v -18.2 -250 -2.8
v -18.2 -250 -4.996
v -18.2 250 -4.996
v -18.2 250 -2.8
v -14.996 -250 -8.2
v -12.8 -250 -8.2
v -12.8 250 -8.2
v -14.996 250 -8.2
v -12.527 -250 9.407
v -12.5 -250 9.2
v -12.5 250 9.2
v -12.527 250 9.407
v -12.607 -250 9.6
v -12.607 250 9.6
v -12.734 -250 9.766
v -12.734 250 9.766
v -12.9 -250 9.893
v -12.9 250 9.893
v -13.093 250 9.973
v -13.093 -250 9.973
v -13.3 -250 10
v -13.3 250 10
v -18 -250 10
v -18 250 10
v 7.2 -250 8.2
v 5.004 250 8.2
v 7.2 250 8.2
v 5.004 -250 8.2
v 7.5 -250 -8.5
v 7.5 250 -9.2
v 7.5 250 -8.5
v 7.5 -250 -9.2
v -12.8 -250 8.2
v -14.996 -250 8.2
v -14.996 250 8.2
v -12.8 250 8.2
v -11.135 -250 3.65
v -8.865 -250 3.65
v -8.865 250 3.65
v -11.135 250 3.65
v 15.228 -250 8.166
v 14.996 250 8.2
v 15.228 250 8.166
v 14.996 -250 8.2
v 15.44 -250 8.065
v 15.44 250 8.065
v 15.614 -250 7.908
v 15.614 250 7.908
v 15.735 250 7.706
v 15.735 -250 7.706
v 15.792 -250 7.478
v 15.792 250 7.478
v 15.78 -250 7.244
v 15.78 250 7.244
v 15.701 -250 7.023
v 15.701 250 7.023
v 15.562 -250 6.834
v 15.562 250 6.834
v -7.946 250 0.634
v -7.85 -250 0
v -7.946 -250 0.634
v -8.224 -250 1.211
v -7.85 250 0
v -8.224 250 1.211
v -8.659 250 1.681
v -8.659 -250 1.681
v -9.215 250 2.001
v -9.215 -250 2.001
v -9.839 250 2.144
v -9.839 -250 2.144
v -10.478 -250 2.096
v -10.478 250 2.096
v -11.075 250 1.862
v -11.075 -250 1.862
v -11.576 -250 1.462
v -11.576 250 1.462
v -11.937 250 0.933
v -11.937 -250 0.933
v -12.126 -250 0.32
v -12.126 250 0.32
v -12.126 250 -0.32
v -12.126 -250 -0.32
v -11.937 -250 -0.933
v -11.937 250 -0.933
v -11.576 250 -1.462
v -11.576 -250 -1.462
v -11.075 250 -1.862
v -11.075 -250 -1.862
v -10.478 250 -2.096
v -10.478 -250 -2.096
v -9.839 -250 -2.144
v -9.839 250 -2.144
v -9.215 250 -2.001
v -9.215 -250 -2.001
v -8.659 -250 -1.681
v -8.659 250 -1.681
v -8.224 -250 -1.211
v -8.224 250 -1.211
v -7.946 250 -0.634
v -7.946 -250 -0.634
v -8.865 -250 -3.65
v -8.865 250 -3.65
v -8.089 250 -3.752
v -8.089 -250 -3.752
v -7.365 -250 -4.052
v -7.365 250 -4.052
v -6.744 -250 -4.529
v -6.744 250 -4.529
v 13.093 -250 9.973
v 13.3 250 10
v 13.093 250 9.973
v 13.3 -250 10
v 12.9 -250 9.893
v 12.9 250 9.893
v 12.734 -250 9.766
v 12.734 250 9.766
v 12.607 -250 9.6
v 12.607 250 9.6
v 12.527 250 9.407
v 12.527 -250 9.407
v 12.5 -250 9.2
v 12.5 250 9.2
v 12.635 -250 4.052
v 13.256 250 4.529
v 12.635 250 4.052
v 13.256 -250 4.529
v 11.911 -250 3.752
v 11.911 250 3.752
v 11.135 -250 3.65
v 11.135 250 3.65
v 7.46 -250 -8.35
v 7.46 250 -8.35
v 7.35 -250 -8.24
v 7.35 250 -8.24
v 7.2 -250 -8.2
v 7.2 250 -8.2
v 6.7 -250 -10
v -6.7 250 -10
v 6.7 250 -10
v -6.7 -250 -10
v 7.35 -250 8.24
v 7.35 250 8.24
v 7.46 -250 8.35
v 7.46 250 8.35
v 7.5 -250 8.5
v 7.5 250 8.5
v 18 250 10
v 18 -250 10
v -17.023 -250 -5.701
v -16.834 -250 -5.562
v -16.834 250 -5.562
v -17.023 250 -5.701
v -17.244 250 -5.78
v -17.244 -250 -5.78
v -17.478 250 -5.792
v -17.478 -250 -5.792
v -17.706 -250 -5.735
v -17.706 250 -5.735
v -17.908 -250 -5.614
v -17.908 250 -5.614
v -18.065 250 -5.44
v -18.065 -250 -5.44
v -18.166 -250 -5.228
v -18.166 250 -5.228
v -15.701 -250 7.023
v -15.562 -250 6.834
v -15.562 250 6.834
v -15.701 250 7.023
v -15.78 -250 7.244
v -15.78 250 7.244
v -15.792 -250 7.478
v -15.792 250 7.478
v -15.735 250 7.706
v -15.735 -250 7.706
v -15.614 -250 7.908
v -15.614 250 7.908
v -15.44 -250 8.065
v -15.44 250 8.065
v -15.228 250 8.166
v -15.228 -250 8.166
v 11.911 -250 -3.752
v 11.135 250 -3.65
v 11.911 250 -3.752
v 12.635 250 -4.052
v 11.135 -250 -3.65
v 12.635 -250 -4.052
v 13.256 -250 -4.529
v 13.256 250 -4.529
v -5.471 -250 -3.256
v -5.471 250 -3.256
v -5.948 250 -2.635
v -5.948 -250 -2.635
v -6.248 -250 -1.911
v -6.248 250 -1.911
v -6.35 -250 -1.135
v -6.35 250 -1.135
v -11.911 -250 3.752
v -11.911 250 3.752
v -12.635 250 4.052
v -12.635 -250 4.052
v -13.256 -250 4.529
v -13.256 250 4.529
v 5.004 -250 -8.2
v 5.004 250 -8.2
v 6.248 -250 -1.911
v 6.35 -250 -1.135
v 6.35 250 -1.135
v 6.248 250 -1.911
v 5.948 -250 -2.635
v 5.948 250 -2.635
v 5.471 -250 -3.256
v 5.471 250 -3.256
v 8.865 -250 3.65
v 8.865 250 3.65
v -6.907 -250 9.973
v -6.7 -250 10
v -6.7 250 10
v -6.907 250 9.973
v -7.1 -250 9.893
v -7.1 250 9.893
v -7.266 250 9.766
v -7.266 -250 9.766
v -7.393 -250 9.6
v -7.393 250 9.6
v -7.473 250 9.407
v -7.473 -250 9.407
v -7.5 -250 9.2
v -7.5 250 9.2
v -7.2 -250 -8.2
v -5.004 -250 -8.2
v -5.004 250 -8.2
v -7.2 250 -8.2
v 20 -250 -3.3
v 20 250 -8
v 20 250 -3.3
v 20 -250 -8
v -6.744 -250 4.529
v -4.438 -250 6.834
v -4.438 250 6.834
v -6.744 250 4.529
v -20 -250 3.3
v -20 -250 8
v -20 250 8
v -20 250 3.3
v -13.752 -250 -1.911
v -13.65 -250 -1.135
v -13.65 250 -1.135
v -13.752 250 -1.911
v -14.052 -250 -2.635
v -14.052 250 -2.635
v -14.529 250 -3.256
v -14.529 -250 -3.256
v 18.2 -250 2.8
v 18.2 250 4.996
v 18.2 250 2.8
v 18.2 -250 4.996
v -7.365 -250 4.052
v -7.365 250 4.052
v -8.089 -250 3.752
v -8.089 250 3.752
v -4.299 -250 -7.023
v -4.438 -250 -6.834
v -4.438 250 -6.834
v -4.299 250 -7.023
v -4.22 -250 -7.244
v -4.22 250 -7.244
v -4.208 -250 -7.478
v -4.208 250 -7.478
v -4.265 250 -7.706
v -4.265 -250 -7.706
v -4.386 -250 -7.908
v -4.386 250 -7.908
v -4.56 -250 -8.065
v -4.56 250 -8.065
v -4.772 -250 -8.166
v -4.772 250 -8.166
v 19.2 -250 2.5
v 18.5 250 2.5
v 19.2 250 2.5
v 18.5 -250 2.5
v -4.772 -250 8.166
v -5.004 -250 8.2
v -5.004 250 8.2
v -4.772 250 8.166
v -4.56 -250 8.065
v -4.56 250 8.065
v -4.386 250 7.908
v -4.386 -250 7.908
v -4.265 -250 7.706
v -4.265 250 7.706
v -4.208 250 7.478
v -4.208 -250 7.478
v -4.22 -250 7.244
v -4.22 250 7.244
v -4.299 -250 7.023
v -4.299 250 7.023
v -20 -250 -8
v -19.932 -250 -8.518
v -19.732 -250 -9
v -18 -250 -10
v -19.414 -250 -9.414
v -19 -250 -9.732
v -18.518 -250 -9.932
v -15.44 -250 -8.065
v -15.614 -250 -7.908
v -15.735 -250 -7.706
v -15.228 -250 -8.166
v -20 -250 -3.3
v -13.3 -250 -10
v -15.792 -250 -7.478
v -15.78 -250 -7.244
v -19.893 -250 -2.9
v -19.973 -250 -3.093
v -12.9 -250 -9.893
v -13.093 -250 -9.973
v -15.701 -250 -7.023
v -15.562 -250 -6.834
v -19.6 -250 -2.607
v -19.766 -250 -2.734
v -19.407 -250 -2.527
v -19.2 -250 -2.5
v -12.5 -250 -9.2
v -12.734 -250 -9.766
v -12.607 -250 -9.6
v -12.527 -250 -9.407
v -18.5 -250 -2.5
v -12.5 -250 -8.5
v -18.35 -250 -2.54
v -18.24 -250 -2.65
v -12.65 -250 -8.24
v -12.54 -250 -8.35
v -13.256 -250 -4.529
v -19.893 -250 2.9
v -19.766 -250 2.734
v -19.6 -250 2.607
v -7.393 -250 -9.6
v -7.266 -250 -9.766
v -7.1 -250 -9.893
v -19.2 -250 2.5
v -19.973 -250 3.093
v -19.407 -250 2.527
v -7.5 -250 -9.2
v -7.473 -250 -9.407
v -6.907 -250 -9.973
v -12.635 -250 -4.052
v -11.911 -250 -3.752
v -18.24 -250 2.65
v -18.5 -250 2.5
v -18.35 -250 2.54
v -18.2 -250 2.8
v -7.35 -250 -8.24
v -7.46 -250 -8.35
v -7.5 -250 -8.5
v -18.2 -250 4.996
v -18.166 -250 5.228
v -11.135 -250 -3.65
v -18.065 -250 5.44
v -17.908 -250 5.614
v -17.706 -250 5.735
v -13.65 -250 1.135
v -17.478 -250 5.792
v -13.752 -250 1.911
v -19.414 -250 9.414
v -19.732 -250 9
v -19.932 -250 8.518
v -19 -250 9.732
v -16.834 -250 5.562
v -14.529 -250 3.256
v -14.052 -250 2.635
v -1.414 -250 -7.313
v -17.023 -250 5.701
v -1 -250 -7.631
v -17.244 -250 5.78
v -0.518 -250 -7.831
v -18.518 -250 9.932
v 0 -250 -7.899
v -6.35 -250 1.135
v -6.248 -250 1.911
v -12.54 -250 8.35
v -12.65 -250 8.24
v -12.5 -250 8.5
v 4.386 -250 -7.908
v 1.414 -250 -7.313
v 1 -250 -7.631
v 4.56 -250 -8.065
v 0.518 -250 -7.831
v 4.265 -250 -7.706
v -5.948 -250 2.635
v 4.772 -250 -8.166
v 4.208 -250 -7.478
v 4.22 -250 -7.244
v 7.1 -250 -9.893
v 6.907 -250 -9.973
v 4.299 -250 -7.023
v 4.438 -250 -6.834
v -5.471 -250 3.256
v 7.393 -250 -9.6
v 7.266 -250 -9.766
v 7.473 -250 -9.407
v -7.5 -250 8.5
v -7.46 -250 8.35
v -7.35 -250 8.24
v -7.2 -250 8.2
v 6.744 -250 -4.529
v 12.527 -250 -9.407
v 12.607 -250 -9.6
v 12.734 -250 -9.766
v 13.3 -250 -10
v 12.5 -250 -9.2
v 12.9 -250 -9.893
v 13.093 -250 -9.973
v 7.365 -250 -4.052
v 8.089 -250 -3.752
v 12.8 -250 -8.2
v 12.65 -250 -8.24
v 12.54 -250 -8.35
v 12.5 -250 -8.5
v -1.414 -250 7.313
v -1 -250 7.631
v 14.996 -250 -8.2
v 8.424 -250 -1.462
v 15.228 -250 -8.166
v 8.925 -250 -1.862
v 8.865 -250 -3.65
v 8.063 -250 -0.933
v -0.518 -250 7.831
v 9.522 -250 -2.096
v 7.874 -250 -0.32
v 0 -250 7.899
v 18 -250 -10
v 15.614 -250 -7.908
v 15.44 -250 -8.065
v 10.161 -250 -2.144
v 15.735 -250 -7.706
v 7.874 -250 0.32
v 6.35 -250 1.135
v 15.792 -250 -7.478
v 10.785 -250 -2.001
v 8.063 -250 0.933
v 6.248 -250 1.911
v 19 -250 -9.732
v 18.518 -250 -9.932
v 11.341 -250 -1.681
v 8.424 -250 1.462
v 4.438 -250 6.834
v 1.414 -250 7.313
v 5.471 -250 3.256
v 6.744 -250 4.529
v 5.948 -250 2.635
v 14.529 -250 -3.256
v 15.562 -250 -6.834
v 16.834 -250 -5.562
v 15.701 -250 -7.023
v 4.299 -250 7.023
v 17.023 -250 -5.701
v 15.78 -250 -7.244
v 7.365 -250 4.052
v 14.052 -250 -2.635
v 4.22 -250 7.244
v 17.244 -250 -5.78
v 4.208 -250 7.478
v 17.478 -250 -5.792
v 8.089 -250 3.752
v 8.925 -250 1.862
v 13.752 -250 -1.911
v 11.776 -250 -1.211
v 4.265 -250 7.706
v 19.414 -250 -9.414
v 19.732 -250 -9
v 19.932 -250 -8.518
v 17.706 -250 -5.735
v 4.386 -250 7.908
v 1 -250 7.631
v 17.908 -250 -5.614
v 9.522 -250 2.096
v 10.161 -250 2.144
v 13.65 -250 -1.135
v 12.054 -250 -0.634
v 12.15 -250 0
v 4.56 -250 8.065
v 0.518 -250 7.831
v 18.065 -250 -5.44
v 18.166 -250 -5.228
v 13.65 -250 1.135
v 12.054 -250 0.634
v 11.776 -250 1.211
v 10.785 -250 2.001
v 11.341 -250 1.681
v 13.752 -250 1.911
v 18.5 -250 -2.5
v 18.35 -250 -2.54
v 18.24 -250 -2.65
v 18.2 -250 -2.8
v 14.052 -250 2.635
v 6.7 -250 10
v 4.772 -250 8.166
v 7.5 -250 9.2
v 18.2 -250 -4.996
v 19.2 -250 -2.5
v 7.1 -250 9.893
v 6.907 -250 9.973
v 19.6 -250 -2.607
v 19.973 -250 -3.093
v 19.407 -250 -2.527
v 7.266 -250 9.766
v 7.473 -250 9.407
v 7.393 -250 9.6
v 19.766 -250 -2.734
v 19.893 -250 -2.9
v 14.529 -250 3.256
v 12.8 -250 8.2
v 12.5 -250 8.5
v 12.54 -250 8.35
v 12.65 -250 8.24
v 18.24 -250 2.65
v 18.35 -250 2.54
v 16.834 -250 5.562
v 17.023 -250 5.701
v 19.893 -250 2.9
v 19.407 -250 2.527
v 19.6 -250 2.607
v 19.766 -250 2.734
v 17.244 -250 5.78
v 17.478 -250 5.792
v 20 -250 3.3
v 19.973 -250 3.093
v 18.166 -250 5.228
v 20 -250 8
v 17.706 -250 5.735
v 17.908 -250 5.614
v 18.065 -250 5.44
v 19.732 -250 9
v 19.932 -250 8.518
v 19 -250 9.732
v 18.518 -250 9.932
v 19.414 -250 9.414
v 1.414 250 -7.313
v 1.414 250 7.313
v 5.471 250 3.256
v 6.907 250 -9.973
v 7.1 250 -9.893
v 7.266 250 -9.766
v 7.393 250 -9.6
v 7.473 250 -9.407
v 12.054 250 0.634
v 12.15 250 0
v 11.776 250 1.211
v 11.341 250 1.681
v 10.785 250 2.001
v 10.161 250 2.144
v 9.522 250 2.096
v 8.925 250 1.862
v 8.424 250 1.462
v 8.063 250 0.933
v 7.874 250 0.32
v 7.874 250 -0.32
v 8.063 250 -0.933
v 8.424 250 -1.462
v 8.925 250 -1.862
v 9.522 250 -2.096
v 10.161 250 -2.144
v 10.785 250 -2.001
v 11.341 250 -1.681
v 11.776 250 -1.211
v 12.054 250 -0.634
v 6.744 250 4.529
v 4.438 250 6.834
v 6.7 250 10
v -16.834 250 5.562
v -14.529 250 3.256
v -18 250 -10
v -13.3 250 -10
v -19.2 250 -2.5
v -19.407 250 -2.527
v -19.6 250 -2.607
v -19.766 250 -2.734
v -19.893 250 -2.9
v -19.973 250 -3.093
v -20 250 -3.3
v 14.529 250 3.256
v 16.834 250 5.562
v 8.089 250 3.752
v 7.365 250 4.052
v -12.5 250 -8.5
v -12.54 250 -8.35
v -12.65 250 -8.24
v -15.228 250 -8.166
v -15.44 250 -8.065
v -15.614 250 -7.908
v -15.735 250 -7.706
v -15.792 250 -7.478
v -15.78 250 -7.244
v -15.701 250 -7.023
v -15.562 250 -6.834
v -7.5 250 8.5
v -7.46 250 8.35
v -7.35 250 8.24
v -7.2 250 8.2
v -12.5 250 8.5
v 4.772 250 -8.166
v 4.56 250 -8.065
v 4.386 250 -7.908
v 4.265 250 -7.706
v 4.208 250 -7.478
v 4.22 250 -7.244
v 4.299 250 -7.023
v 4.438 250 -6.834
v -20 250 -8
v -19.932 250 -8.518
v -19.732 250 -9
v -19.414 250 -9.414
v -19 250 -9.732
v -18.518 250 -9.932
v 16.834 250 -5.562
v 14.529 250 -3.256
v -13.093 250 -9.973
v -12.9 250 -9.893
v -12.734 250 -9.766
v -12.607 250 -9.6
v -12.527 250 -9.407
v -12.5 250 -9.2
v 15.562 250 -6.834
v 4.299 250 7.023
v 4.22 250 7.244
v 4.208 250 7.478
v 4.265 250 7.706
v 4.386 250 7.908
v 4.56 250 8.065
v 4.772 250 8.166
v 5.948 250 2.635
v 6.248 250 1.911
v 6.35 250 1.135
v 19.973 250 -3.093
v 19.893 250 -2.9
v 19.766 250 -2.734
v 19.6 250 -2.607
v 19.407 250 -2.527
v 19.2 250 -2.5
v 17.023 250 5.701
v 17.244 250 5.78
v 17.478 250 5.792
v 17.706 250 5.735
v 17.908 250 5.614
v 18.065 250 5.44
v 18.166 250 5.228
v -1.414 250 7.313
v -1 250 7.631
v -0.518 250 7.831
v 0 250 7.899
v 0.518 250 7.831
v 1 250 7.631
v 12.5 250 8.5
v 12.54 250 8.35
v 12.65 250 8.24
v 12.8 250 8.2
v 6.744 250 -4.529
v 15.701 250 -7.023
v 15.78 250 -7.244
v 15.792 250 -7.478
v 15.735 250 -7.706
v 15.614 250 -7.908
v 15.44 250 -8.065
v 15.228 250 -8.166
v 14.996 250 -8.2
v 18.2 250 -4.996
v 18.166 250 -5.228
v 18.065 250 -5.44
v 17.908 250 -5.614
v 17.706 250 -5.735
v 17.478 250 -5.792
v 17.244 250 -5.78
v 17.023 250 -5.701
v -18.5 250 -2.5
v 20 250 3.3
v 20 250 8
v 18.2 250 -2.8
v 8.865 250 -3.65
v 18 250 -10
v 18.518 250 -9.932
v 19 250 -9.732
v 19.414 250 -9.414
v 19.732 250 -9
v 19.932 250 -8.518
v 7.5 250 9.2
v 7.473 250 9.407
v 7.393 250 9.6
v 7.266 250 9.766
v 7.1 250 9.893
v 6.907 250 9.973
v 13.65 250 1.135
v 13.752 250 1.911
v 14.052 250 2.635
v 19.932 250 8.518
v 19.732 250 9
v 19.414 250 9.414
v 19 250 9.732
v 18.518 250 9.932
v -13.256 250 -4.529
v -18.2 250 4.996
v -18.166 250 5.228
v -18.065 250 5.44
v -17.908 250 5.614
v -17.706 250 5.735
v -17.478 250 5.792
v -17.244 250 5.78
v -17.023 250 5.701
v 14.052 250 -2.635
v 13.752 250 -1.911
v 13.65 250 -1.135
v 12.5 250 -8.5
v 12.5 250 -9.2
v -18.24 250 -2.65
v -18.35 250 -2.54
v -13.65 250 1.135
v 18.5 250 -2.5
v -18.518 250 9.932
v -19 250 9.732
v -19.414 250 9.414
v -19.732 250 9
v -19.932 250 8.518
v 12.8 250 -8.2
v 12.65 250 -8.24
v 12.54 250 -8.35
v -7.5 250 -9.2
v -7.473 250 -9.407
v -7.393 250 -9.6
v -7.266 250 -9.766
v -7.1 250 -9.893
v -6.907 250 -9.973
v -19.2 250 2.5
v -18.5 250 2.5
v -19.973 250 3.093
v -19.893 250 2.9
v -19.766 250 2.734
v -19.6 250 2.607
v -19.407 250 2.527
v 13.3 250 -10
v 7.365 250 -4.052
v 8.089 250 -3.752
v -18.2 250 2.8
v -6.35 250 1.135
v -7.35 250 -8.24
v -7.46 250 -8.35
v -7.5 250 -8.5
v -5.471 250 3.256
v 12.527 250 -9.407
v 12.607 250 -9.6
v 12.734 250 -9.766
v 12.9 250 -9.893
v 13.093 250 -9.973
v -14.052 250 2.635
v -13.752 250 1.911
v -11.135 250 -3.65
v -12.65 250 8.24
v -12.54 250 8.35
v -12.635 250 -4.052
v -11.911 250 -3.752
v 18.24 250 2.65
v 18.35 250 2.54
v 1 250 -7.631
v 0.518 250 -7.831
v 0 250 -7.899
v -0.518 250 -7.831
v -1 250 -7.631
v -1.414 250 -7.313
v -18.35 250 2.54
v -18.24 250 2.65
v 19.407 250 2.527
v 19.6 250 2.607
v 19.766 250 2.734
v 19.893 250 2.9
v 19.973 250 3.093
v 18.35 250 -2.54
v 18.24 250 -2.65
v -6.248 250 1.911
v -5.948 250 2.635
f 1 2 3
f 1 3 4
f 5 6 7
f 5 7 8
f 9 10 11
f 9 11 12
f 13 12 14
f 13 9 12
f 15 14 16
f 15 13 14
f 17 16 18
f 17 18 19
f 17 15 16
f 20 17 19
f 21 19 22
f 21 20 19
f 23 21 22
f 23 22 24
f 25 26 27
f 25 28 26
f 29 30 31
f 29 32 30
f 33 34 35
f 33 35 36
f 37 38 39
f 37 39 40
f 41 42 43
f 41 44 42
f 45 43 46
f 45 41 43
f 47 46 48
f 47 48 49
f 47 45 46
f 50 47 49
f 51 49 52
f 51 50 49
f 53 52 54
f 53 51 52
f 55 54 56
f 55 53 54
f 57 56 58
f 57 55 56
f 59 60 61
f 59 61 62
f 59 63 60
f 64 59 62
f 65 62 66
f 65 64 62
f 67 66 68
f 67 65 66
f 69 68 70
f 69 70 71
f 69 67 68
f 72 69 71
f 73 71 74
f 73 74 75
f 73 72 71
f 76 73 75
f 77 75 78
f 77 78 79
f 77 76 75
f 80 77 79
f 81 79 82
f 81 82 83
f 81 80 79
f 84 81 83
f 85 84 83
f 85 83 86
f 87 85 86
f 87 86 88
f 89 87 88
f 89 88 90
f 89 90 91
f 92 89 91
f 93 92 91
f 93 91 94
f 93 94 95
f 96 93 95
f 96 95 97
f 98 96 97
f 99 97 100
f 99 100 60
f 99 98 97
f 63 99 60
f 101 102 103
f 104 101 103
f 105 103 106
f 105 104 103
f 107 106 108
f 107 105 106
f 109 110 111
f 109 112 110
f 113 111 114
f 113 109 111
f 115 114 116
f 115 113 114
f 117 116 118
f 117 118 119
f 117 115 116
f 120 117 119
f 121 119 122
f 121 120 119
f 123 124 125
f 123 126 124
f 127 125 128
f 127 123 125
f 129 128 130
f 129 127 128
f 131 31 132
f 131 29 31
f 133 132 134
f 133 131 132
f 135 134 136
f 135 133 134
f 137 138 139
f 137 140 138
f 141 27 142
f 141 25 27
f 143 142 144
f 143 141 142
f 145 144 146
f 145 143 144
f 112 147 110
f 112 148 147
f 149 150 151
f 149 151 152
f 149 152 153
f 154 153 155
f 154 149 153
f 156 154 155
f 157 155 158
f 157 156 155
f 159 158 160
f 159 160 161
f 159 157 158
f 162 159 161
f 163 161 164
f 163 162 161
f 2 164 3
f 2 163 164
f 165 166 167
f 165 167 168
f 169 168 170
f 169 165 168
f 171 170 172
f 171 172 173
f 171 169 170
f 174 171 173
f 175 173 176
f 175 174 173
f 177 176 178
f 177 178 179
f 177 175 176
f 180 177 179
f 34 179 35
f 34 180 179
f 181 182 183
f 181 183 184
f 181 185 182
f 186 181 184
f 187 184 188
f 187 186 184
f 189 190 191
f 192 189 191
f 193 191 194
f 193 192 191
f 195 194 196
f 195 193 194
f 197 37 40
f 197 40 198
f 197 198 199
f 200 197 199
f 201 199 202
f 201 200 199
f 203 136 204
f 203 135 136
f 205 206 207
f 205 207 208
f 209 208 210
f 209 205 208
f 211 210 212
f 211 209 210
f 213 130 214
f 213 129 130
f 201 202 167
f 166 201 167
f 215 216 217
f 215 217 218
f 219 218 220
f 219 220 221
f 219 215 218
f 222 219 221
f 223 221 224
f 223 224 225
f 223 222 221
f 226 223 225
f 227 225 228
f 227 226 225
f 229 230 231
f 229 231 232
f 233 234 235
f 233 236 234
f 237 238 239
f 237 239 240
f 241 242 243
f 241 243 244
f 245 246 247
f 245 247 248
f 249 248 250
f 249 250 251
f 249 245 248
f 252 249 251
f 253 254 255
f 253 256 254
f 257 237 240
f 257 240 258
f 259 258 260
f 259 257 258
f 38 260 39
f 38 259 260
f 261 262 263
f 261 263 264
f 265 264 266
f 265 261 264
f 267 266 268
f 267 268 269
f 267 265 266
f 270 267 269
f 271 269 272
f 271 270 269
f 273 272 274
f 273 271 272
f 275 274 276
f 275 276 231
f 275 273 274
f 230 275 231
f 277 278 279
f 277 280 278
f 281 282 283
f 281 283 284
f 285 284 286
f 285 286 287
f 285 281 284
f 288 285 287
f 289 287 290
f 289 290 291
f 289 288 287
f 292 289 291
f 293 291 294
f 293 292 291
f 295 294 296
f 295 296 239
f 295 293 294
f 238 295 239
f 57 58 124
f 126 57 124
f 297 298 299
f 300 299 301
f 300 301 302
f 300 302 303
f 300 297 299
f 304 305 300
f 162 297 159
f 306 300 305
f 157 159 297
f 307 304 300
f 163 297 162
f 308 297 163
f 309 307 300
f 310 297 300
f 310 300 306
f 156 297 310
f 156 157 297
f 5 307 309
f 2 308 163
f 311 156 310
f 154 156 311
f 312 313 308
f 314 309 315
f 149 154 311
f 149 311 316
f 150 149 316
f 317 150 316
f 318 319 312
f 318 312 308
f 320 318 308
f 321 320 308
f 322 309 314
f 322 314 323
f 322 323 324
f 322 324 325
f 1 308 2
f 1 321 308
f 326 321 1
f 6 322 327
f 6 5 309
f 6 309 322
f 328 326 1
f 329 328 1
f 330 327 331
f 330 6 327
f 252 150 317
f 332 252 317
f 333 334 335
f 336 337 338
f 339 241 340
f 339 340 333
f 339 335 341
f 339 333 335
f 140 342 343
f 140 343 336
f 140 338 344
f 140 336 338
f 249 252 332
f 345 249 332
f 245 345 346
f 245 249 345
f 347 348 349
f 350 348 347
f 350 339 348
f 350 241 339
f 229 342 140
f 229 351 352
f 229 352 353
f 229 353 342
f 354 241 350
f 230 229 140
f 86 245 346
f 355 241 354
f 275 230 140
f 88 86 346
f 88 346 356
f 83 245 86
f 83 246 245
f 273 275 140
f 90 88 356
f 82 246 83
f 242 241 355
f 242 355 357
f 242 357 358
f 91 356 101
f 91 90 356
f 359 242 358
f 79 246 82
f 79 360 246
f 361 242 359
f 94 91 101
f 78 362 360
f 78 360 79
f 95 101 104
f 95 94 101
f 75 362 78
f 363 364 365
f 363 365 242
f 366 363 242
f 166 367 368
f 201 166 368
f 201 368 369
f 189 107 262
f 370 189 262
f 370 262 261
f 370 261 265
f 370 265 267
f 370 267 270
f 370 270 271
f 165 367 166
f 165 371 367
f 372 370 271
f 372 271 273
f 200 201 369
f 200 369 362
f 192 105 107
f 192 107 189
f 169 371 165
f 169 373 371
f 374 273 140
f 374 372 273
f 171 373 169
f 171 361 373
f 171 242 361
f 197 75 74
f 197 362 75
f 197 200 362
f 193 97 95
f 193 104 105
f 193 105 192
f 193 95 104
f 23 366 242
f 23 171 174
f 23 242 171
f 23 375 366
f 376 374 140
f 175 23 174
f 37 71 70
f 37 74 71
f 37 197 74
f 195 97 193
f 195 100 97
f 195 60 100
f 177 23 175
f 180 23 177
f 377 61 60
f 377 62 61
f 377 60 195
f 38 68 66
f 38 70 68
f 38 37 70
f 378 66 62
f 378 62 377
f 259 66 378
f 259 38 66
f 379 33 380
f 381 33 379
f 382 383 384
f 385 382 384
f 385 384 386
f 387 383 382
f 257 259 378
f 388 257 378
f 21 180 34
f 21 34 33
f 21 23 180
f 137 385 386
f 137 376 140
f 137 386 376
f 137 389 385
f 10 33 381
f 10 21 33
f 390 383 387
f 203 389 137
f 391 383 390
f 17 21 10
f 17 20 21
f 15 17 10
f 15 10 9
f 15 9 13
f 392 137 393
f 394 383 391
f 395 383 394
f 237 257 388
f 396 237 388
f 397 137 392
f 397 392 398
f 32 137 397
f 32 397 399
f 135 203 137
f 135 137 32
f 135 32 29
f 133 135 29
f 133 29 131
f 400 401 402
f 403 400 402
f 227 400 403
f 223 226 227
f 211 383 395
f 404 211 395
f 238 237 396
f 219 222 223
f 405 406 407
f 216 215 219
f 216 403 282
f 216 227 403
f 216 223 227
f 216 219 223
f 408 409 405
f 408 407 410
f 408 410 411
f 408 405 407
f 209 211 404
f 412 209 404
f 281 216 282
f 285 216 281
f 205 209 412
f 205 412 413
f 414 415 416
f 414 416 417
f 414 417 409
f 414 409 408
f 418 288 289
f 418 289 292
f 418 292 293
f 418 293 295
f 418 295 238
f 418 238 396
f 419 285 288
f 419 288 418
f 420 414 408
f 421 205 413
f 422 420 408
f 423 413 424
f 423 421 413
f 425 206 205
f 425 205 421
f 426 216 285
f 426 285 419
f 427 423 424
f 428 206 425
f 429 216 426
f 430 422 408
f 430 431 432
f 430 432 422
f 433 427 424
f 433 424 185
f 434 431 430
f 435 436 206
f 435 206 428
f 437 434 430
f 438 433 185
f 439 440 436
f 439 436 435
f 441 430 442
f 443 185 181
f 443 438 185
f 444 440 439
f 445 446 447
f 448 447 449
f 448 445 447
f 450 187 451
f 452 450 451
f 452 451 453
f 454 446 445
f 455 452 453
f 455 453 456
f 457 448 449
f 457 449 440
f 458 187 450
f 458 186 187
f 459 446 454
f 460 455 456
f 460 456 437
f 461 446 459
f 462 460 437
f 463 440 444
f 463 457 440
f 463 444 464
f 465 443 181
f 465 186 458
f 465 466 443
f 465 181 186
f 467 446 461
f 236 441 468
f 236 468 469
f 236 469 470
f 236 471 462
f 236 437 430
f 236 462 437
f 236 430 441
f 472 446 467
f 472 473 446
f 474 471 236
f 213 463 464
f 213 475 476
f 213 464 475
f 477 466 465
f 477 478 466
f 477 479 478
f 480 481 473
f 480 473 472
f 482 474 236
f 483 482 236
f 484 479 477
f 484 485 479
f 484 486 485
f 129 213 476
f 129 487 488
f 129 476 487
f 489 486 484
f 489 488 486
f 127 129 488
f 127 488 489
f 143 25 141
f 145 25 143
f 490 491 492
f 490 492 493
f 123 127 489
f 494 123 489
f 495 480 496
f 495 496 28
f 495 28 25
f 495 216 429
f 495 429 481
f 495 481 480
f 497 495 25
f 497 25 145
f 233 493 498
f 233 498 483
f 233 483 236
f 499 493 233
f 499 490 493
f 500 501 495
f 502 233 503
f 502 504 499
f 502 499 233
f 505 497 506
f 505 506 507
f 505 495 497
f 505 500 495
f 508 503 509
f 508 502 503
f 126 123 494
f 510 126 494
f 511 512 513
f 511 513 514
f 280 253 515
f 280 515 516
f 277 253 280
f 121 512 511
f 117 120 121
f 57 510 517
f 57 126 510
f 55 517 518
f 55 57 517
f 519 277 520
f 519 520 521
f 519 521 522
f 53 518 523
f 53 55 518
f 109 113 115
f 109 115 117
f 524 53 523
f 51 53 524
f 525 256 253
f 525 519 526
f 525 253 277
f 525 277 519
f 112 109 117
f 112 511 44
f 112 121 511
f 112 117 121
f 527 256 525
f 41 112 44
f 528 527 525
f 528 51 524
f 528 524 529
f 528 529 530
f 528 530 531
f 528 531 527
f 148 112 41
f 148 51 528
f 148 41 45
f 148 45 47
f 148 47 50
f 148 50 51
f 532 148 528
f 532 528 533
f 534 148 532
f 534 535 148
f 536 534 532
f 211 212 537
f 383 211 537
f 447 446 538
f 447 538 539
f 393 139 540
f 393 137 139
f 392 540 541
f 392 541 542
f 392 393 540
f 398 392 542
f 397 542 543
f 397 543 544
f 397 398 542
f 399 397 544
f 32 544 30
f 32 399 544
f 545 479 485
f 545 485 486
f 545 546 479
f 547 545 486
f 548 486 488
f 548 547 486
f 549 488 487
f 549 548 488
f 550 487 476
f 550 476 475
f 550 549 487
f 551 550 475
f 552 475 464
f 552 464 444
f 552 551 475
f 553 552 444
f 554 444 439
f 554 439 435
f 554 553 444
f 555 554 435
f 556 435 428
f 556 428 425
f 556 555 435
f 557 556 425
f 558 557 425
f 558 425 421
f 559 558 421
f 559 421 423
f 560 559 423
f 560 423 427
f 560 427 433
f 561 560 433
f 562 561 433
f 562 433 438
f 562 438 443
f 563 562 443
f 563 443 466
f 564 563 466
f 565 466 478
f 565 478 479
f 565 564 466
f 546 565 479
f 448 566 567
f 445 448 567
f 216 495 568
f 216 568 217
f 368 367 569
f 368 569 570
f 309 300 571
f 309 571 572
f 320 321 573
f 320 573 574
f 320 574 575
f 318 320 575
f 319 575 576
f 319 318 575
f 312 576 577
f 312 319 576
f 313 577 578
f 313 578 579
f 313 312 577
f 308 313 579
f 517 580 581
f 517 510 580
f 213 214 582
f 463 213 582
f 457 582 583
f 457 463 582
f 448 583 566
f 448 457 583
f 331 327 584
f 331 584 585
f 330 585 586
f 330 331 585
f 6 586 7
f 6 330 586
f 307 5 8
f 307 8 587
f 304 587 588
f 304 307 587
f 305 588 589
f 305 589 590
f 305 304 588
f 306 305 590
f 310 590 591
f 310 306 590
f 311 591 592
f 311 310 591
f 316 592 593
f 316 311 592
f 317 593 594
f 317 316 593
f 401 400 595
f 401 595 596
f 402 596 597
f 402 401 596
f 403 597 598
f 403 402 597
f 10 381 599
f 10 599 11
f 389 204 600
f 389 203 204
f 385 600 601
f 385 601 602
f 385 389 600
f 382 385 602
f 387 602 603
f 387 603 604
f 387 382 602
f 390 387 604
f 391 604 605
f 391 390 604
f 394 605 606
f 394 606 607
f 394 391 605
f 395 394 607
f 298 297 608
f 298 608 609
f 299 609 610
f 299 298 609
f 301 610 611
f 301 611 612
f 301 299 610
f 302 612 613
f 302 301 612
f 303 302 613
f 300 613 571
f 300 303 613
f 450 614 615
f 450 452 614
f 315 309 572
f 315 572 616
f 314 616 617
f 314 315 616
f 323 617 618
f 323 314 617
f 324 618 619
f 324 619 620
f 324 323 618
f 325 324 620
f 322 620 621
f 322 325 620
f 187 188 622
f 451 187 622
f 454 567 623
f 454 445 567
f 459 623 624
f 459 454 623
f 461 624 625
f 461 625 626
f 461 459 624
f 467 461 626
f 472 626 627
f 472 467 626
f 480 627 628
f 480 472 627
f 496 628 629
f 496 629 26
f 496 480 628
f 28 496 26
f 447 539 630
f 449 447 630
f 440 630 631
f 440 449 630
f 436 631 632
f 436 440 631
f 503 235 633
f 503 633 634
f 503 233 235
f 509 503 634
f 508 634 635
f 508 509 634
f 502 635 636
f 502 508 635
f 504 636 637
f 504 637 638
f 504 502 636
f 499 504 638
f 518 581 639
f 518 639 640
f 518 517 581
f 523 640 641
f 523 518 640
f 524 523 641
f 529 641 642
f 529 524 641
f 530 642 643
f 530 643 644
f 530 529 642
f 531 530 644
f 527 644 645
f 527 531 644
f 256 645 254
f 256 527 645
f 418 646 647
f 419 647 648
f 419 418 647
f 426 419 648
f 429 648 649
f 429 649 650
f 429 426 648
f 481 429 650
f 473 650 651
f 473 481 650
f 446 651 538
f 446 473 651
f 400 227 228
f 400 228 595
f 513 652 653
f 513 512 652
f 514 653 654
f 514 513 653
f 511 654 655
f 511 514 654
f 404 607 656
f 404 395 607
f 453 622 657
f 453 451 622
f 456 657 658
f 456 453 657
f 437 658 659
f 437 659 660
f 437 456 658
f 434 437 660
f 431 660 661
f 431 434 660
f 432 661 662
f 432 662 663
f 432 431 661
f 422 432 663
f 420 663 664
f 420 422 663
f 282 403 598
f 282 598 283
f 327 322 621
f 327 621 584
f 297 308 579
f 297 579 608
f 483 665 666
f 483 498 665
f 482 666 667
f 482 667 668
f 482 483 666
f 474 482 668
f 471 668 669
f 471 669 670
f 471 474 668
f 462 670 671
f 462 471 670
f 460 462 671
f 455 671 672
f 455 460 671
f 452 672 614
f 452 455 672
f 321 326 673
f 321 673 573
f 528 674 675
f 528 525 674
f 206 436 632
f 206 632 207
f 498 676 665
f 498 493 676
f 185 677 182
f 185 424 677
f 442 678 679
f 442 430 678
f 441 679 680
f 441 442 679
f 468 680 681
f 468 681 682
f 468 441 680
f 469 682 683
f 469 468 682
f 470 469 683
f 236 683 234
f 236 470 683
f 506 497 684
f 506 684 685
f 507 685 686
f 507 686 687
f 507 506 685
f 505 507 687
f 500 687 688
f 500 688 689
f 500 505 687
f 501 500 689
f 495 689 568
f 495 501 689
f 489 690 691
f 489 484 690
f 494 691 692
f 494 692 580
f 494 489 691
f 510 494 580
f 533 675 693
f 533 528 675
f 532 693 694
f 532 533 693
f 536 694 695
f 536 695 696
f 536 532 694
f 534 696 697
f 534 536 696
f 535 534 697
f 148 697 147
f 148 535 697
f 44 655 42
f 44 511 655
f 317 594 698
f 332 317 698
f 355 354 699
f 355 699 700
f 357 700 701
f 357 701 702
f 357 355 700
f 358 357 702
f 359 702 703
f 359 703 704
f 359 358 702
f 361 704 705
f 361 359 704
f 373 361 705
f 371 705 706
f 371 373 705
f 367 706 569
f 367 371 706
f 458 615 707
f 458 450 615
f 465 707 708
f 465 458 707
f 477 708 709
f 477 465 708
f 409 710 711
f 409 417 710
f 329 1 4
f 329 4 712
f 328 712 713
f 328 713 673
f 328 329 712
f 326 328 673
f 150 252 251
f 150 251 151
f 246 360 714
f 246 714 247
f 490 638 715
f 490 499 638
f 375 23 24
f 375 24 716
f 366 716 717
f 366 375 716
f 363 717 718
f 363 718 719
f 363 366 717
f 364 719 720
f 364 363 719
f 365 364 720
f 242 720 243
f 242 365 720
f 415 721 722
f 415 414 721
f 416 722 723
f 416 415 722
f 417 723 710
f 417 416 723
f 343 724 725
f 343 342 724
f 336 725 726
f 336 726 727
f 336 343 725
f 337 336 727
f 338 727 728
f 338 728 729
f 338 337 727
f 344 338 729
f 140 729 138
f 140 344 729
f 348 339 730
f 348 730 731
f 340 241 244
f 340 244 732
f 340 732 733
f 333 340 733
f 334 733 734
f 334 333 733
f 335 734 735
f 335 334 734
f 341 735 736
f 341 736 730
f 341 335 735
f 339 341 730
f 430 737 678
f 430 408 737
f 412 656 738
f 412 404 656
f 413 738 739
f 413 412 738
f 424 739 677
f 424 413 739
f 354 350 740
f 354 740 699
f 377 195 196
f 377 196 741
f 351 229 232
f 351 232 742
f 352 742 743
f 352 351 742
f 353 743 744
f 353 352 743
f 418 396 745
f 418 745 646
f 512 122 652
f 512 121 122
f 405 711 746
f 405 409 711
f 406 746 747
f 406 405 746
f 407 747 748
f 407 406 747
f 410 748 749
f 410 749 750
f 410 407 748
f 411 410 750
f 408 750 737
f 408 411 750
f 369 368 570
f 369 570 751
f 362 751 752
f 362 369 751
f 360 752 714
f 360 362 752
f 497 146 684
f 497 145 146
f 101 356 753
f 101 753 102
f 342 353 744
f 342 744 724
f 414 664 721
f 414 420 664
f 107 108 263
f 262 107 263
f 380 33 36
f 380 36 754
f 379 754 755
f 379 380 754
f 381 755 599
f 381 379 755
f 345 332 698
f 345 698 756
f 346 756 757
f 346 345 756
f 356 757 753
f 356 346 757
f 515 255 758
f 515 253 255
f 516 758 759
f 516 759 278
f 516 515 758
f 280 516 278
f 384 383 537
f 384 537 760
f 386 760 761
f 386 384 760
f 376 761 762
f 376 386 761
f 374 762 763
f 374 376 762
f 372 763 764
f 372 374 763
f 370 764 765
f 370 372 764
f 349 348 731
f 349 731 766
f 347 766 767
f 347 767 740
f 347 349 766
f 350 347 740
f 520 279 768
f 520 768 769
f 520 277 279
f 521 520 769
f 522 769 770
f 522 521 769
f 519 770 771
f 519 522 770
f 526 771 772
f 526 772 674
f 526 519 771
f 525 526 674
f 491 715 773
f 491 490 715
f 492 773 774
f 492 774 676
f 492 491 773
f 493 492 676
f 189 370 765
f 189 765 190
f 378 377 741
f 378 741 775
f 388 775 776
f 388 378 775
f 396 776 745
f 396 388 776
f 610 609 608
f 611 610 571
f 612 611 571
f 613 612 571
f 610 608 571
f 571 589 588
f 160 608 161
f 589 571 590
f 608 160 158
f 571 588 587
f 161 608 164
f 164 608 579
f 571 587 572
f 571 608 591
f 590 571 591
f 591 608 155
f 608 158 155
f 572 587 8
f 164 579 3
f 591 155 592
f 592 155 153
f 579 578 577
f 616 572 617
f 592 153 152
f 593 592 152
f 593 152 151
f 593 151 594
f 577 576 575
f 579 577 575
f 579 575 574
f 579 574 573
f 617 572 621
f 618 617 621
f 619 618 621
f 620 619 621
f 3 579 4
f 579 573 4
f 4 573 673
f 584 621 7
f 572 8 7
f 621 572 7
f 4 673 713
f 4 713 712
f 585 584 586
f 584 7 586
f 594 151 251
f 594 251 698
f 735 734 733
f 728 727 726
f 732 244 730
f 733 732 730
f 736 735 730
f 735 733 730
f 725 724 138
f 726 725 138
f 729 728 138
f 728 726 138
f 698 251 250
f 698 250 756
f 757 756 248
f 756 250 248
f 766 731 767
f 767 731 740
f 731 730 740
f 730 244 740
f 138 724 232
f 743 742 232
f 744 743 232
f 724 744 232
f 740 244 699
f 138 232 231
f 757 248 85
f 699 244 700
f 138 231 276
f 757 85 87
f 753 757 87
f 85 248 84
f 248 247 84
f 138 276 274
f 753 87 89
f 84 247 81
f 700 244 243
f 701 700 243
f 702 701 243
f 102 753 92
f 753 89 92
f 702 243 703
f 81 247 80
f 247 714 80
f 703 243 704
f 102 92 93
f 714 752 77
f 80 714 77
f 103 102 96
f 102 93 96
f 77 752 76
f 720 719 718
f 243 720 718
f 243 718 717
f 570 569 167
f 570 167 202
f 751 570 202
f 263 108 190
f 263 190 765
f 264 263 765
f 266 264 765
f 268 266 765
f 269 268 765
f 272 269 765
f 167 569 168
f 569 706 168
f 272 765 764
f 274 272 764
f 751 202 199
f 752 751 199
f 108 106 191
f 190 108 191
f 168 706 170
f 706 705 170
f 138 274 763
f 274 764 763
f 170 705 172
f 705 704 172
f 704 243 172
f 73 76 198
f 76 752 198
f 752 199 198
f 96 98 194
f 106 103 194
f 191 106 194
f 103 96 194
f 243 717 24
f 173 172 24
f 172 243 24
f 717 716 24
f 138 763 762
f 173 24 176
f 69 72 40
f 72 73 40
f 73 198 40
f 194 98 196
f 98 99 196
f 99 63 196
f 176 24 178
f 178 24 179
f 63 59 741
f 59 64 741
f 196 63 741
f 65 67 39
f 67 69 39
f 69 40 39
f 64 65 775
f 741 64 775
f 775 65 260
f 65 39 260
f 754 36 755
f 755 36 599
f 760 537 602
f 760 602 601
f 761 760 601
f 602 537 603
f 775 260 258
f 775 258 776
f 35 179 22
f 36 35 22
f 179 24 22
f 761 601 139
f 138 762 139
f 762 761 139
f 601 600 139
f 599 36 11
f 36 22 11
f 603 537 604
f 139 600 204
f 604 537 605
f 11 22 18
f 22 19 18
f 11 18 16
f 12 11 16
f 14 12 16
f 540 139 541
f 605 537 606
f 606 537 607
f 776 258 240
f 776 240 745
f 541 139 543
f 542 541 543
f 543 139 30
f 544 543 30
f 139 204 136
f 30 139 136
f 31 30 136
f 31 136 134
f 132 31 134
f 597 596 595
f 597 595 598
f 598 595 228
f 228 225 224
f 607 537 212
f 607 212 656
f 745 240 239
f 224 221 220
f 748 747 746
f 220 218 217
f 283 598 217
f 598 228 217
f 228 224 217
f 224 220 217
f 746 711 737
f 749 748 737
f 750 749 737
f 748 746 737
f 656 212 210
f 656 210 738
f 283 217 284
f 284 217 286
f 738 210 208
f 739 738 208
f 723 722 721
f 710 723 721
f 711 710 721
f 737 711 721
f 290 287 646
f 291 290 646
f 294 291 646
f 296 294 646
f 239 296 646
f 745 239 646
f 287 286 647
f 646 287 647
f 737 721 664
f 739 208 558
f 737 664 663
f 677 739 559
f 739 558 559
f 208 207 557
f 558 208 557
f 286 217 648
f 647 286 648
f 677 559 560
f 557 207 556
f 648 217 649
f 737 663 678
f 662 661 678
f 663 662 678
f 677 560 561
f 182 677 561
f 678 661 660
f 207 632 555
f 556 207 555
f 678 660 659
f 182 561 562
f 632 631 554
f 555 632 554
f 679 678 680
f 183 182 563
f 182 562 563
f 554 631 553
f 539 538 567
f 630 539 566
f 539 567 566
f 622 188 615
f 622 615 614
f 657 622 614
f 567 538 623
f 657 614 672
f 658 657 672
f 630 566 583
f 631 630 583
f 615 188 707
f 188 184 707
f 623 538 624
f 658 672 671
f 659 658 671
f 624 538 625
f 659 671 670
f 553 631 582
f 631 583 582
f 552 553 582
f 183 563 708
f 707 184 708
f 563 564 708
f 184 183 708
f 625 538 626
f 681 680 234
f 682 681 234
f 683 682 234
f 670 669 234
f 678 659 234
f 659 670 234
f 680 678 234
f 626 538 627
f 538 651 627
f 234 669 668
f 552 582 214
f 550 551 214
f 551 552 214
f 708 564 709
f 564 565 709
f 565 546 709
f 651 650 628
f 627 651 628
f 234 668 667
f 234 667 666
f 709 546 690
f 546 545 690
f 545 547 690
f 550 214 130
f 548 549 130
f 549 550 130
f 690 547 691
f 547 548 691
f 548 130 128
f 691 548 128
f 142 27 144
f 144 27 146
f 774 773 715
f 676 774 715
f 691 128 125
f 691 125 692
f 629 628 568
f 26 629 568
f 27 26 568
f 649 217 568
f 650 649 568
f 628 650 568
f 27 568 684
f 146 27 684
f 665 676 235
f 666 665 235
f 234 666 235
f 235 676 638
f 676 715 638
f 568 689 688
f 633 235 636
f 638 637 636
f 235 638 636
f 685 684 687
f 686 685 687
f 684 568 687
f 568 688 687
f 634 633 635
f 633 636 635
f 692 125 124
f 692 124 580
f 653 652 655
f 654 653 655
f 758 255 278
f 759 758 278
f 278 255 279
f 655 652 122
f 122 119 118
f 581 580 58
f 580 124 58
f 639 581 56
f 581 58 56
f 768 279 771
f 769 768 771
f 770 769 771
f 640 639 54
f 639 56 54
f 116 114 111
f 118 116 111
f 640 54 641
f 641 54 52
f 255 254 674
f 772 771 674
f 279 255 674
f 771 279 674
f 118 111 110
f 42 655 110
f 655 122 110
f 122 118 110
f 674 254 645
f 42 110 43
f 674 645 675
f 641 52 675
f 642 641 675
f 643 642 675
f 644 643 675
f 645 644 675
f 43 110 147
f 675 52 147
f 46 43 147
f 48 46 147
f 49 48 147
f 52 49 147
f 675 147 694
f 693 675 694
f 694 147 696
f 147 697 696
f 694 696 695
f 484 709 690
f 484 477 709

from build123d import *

# Parameters (mm, degrees)
F0_R     = 2.15
F1_DEPTH = 250


# Not quite as in the source:
# - ends of sketch curves that miss each other by under 0.0002 mm in the source are joined


with BuildPart() as f1:
    # F0 (on Front) → F1 (new body, symmetric)
    with BuildSketch(Plane.XZ):
        with BuildLine():
            Line((7.5, 8.5), (7.5, 9.2))
            ThreePointArc((7.5, 9.2), (7.2656854249, 9.7656854249), (6.7, 10))
            Line((6.7, 10), (-6.7, 10))
            ThreePointArc((-6.7, 10), (-7.2656854249, 9.7656854249), (-7.5, 9.2))
            Line((-7.5, 9.2), (-7.5, 8.5))
            ThreePointArc((-7.5, 8.5), (-7.4121320344, 8.2878679656), (-7.2, 8.2))
            Line((-7.2, 8.2), (-5.004162, 8.2))
            ThreePointArc((-5.004162, 8.2), (-4.2650582387, 7.7061464193), (-4.4384770751, 6.8343140751))
            Line((-4.4384770751, 6.8343140751), (-6.744114, 4.528679))
            ThreePointArc((-6.744114, 4.528679), (-7.7173840295, 3.8783612672), (-8.865434, 3.65))
            Line((-8.865434, 3.65), (-11.134566, 3.65))
            ThreePointArc((-11.134566, 3.65), (-12.2826159705, 3.8783612672), (-13.2558858436, 4.5286791564))
            Line((-13.2558858436, 4.5286791564), (-15.561523, 6.834314))
            ThreePointArc((-15.561523, 6.834314), (-15.7349417613, 7.7061464193), (-14.995838, 8.2))
            Line((-14.995838, 8.2), (-12.8, 8.2))
            ThreePointArc((-12.8, 8.2), (-12.5878679656, 8.2878679656), (-12.5, 8.5))
            Line((-12.5, 8.5), (-12.5, 9.2))
            ThreePointArc((-12.5, 9.2), (-12.7343145751, 9.7656854249), (-13.3, 10))
            Line((-13.3, 10), (-18, 10))
            ThreePointArc((-18, 10), (-19.4142135624, 9.4142135624), (-20, 8))
            Line((-20, 8), (-20, 3.3))
            ThreePointArc((-20, 3.3), (-19.7656854249, 2.7343145751), (-19.2, 2.5))
            Line((-19.2, 2.5), (-18.500003, 2.5))
            ThreePointArc((-18.500003, 2.5), (-18.2878709656, 2.5878679656), (-18.200003, 2.8))
            Line((-18.200003, 2.8), (-18.200003, 4.995834))
            ThreePointArc((-18.200003, 4.995834), (-17.7061497459, 5.734937626), (-16.8343175751, 5.5615194249))
            Line((-16.8343175751, 5.5615194249), (-14.528682, 3.255884))
            ThreePointArc((-14.528682, 3.255884), (-13.8783635378, 2.2826136237), (-13.650002, 1.134563))
            Line((-13.650002, 1.134563), (-13.650002, -1.134563))
            ThreePointArc((-13.650002, -1.134563), (-13.8783635378, -2.2826136237), (-14.5286821564, -3.2558838436))
            Line((-14.5286821564, -3.2558838436), (-16.834318, -5.561519))
            ThreePointArc((-16.834318, -5.561519), (-17.7061497459, -5.734937626), (-18.200003, -4.995834))
            Line((-18.200003, -4.995834), (-18.200003, -2.8))
            ThreePointArc((-18.200003, -2.8), (-18.2878709656, -2.5878679656), (-18.500003, -2.5))
            Line((-18.500003, -2.5), (-19.2, -2.5))
            ThreePointArc((-19.2, -2.5), (-19.7656854249, -2.7343145751), (-20, -3.3))
            Line((-20, -3.3), (-20, -8))
            ThreePointArc((-20, -8), (-19.4142135624, -9.4142135624), (-18, -10))
            Line((-18, -10), (-13.3, -10))
            ThreePointArc((-13.3, -10), (-12.7343145751, -9.7656854249), (-12.5, -9.2))
            Line((-12.5, -9.2), (-12.5, -8.5))
            ThreePointArc((-12.5, -8.5), (-12.5878679656, -8.2878679656), (-12.8, -8.2))
            Line((-12.8, -8.2), (-14.995838, -8.2))
            ThreePointArc((-14.995838, -8.2), (-15.7349417613, -7.7061464193), (-15.5615229249, -6.8343140751))
            Line((-15.5615229249, -6.8343140751), (-13.255886, -4.528679))
            ThreePointArc((-13.255886, -4.528679), (-12.2826159705, -3.8783612672), (-11.134566, -3.65))
            Line((-11.134566, -3.65), (-8.865434, -3.65))
            ThreePointArc((-8.865434, -3.65), (-7.7173840295, -3.8783612672), (-6.7441141564, -4.5286791564))
            Line((-6.7441141564, -4.5286791564), (-4.438477, -6.834314))
            ThreePointArc((-4.438477, -6.834314), (-4.2650582387, -7.7061464193), (-5.004162, -8.2))
            Line((-5.004162, -8.2), (-7.2, -8.2))
            ThreePointArc((-7.2, -8.2), (-7.4121320344, -8.2878679656), (-7.5, -8.5))
            Line((-7.5, -8.5), (-7.5, -9.2))
            ThreePointArc((-7.5, -9.2), (-7.2656854249, -9.7656854249), (-6.7, -10))
            Line((-6.7, -10), (6.7, -10))
            ThreePointArc((6.7, -10), (7.2656854249, -9.7656854249), (7.5, -9.2))
            Line((7.5, -9.2), (7.5, -8.5))
            ThreePointArc((7.5, -8.5), (7.4121320344, -8.2878679656), (7.2, -8.2))
            Line((7.2, -8.2), (5.004162, -8.2))
            ThreePointArc((5.004162, -8.2), (4.2650582387, -7.7061464193), (4.4384770751, -6.8343140751))
            Line((4.4384770751, -6.8343140751), (6.744114, -4.528679))
            ThreePointArc((6.744114, -4.528679), (7.7173840295, -3.8783612672), (8.865434, -3.65))
            Line((8.865434, -3.65), (11.134566, -3.65))
            ThreePointArc((11.134566, -3.65), (12.2826159705, -3.8783612672), (13.2558858436, -4.5286791564))
            Line((13.2558858436, -4.5286791564), (15.561523, -6.834314))
            ThreePointArc((15.561523, -6.834314), (15.7349417613, -7.7061464193), (14.995838, -8.2))
            Line((14.995838, -8.2), (12.8, -8.2))
            ThreePointArc((12.8, -8.2), (12.5878679656, -8.2878679656), (12.5, -8.5))
            Line((12.5, -8.5), (12.5, -9.2))
            ThreePointArc((12.5, -9.2), (12.7343145751, -9.7656854249), (13.3, -10))
            Line((13.3, -10), (18, -10))
            ThreePointArc((18, -10), (19.4142135624, -9.4142135624), (20, -8))
            Line((20, -8), (20, -3.3))
            ThreePointArc((20, -3.3), (19.7656854249, -2.7343145751), (19.2, -2.5))
            Line((19.2, -2.5), (18.500003, -2.5))
            ThreePointArc((18.500003, -2.5), (18.2878709656, -2.5878679656), (18.200003, -2.8))
            Line((18.200003, -2.8), (18.200003, -4.995834))
            ThreePointArc((18.200003, -4.995834), (17.7061497459, -5.734937626), (16.8343175751, -5.5615194249))
            Line((16.8343175751, -5.5615194249), (14.528682, -3.255884))
            ThreePointArc((14.528682, -3.255884), (13.8783635378, -2.2826136237), (13.650002, -1.134563))
            Line((13.650002, -1.134563), (13.650002, 1.134563))
            ThreePointArc((13.650002, 1.134563), (13.8783635378, 2.2826136237), (14.5286821564, 3.2558838436))
            Line((14.5286821564, 3.2558838436), (16.834318, 5.561519))
            ThreePointArc((16.834318, 5.561519), (17.7061497459, 5.734937626), (18.200003, 4.995834))
            Line((18.200003, 4.995834), (18.200003, 2.8))
            ThreePointArc((18.200003, 2.8), (18.2878709656, 2.5878679656), (18.500003, 2.5))
            Line((18.500003, 2.5), (19.2, 2.5))
            ThreePointArc((19.2, 2.5), (19.7656854249, 2.7343145751), (20, 3.3))
            Line((20, 3.3), (20, 8))
            ThreePointArc((20, 8), (19.4142135624, 9.4142135624), (18, 10))
            Line((18, 10), (13.3, 10))
            ThreePointArc((13.3, 10), (12.7343145751, 9.7656854249), (12.5, 9.2))
            Line((12.5, 9.2), (12.5, 8.5))
            ThreePointArc((12.5, 8.5), (12.5878679656, 8.2878679656), (12.8, 8.2))
            Line((12.8, 8.2), (14.995838, 8.2))
            ThreePointArc((14.995838, 8.2), (15.7349417613, 7.7061464193), (15.5615229249, 6.8343140751))
            Line((15.5615229249, 6.8343140751), (13.255886, 4.528679))
            ThreePointArc((13.255886, 4.528679), (12.2826159705, 3.8783612672), (11.134566, 3.65))
            Line((11.134566, 3.65), (8.865434, 3.65))
            ThreePointArc((8.865434, 3.65), (7.7173840295, 3.8783612672), (6.7441141564, 4.5286791564))
            Line((6.7441141564, 4.5286791564), (4.438477, 6.834314))
            ThreePointArc((4.438477, 6.834314), (4.2650582387, 7.7061464193), (5.004162, 8.2))
            Line((5.004162, 8.2), (7.2, 8.2))
            ThreePointArc((7.2, 8.2), (7.4121320344, 8.2878679656), (7.5, 8.5))
        make_face()
        with Locations((-10, 0)):
            Circle(F0_R, mode=Mode.SUBTRACT)
        with BuildLine():
            ThreePointArc((-1.4142130624, 7.3129870624), (0, 7.898773), (1.4142130624, 7.3129870624))
            Line((1.4142130624, 7.3129870624), (5.471318, 3.255884))
            ThreePointArc((5.471318, 3.255884), (6.1216364622, 2.2826136237), (6.349998, 1.134563))
            Line((6.349998, 1.134563), (6.349998, -1.134563))
            ThreePointArc((6.349998, -1.134563), (6.1216364622, -2.2826136237), (5.4713178436, -3.2558838436))
            Line((5.4713178436, -3.2558838436), (1.414213, -7.312987))
            ThreePointArc((1.414213, -7.312987), (0, -7.898773), (-1.4142130624, -7.3129870624))
            Line((-1.4142130624, -7.3129870624), (-5.471318, -3.255884))
            ThreePointArc((-5.471318, -3.255884), (-6.1216364622, -2.2826136237), (-6.349998, -1.134563))
            Line((-6.349998, -1.134563), (-6.349998, 1.134563))
            ThreePointArc((-6.349998, 1.134563), (-6.1216364622, 2.2826136237), (-5.4713178436, 3.2558838436))
            Line((-5.4713178436, 3.2558838436), (-1.4142130624, 7.3129870624))
        make_face(mode=Mode.SUBTRACT)
        with Locations((10, 0)):
            Circle(F0_R, mode=Mode.SUBTRACT)
    extrude(amount=F1_DEPTH, both=True)


solid = f1.part
